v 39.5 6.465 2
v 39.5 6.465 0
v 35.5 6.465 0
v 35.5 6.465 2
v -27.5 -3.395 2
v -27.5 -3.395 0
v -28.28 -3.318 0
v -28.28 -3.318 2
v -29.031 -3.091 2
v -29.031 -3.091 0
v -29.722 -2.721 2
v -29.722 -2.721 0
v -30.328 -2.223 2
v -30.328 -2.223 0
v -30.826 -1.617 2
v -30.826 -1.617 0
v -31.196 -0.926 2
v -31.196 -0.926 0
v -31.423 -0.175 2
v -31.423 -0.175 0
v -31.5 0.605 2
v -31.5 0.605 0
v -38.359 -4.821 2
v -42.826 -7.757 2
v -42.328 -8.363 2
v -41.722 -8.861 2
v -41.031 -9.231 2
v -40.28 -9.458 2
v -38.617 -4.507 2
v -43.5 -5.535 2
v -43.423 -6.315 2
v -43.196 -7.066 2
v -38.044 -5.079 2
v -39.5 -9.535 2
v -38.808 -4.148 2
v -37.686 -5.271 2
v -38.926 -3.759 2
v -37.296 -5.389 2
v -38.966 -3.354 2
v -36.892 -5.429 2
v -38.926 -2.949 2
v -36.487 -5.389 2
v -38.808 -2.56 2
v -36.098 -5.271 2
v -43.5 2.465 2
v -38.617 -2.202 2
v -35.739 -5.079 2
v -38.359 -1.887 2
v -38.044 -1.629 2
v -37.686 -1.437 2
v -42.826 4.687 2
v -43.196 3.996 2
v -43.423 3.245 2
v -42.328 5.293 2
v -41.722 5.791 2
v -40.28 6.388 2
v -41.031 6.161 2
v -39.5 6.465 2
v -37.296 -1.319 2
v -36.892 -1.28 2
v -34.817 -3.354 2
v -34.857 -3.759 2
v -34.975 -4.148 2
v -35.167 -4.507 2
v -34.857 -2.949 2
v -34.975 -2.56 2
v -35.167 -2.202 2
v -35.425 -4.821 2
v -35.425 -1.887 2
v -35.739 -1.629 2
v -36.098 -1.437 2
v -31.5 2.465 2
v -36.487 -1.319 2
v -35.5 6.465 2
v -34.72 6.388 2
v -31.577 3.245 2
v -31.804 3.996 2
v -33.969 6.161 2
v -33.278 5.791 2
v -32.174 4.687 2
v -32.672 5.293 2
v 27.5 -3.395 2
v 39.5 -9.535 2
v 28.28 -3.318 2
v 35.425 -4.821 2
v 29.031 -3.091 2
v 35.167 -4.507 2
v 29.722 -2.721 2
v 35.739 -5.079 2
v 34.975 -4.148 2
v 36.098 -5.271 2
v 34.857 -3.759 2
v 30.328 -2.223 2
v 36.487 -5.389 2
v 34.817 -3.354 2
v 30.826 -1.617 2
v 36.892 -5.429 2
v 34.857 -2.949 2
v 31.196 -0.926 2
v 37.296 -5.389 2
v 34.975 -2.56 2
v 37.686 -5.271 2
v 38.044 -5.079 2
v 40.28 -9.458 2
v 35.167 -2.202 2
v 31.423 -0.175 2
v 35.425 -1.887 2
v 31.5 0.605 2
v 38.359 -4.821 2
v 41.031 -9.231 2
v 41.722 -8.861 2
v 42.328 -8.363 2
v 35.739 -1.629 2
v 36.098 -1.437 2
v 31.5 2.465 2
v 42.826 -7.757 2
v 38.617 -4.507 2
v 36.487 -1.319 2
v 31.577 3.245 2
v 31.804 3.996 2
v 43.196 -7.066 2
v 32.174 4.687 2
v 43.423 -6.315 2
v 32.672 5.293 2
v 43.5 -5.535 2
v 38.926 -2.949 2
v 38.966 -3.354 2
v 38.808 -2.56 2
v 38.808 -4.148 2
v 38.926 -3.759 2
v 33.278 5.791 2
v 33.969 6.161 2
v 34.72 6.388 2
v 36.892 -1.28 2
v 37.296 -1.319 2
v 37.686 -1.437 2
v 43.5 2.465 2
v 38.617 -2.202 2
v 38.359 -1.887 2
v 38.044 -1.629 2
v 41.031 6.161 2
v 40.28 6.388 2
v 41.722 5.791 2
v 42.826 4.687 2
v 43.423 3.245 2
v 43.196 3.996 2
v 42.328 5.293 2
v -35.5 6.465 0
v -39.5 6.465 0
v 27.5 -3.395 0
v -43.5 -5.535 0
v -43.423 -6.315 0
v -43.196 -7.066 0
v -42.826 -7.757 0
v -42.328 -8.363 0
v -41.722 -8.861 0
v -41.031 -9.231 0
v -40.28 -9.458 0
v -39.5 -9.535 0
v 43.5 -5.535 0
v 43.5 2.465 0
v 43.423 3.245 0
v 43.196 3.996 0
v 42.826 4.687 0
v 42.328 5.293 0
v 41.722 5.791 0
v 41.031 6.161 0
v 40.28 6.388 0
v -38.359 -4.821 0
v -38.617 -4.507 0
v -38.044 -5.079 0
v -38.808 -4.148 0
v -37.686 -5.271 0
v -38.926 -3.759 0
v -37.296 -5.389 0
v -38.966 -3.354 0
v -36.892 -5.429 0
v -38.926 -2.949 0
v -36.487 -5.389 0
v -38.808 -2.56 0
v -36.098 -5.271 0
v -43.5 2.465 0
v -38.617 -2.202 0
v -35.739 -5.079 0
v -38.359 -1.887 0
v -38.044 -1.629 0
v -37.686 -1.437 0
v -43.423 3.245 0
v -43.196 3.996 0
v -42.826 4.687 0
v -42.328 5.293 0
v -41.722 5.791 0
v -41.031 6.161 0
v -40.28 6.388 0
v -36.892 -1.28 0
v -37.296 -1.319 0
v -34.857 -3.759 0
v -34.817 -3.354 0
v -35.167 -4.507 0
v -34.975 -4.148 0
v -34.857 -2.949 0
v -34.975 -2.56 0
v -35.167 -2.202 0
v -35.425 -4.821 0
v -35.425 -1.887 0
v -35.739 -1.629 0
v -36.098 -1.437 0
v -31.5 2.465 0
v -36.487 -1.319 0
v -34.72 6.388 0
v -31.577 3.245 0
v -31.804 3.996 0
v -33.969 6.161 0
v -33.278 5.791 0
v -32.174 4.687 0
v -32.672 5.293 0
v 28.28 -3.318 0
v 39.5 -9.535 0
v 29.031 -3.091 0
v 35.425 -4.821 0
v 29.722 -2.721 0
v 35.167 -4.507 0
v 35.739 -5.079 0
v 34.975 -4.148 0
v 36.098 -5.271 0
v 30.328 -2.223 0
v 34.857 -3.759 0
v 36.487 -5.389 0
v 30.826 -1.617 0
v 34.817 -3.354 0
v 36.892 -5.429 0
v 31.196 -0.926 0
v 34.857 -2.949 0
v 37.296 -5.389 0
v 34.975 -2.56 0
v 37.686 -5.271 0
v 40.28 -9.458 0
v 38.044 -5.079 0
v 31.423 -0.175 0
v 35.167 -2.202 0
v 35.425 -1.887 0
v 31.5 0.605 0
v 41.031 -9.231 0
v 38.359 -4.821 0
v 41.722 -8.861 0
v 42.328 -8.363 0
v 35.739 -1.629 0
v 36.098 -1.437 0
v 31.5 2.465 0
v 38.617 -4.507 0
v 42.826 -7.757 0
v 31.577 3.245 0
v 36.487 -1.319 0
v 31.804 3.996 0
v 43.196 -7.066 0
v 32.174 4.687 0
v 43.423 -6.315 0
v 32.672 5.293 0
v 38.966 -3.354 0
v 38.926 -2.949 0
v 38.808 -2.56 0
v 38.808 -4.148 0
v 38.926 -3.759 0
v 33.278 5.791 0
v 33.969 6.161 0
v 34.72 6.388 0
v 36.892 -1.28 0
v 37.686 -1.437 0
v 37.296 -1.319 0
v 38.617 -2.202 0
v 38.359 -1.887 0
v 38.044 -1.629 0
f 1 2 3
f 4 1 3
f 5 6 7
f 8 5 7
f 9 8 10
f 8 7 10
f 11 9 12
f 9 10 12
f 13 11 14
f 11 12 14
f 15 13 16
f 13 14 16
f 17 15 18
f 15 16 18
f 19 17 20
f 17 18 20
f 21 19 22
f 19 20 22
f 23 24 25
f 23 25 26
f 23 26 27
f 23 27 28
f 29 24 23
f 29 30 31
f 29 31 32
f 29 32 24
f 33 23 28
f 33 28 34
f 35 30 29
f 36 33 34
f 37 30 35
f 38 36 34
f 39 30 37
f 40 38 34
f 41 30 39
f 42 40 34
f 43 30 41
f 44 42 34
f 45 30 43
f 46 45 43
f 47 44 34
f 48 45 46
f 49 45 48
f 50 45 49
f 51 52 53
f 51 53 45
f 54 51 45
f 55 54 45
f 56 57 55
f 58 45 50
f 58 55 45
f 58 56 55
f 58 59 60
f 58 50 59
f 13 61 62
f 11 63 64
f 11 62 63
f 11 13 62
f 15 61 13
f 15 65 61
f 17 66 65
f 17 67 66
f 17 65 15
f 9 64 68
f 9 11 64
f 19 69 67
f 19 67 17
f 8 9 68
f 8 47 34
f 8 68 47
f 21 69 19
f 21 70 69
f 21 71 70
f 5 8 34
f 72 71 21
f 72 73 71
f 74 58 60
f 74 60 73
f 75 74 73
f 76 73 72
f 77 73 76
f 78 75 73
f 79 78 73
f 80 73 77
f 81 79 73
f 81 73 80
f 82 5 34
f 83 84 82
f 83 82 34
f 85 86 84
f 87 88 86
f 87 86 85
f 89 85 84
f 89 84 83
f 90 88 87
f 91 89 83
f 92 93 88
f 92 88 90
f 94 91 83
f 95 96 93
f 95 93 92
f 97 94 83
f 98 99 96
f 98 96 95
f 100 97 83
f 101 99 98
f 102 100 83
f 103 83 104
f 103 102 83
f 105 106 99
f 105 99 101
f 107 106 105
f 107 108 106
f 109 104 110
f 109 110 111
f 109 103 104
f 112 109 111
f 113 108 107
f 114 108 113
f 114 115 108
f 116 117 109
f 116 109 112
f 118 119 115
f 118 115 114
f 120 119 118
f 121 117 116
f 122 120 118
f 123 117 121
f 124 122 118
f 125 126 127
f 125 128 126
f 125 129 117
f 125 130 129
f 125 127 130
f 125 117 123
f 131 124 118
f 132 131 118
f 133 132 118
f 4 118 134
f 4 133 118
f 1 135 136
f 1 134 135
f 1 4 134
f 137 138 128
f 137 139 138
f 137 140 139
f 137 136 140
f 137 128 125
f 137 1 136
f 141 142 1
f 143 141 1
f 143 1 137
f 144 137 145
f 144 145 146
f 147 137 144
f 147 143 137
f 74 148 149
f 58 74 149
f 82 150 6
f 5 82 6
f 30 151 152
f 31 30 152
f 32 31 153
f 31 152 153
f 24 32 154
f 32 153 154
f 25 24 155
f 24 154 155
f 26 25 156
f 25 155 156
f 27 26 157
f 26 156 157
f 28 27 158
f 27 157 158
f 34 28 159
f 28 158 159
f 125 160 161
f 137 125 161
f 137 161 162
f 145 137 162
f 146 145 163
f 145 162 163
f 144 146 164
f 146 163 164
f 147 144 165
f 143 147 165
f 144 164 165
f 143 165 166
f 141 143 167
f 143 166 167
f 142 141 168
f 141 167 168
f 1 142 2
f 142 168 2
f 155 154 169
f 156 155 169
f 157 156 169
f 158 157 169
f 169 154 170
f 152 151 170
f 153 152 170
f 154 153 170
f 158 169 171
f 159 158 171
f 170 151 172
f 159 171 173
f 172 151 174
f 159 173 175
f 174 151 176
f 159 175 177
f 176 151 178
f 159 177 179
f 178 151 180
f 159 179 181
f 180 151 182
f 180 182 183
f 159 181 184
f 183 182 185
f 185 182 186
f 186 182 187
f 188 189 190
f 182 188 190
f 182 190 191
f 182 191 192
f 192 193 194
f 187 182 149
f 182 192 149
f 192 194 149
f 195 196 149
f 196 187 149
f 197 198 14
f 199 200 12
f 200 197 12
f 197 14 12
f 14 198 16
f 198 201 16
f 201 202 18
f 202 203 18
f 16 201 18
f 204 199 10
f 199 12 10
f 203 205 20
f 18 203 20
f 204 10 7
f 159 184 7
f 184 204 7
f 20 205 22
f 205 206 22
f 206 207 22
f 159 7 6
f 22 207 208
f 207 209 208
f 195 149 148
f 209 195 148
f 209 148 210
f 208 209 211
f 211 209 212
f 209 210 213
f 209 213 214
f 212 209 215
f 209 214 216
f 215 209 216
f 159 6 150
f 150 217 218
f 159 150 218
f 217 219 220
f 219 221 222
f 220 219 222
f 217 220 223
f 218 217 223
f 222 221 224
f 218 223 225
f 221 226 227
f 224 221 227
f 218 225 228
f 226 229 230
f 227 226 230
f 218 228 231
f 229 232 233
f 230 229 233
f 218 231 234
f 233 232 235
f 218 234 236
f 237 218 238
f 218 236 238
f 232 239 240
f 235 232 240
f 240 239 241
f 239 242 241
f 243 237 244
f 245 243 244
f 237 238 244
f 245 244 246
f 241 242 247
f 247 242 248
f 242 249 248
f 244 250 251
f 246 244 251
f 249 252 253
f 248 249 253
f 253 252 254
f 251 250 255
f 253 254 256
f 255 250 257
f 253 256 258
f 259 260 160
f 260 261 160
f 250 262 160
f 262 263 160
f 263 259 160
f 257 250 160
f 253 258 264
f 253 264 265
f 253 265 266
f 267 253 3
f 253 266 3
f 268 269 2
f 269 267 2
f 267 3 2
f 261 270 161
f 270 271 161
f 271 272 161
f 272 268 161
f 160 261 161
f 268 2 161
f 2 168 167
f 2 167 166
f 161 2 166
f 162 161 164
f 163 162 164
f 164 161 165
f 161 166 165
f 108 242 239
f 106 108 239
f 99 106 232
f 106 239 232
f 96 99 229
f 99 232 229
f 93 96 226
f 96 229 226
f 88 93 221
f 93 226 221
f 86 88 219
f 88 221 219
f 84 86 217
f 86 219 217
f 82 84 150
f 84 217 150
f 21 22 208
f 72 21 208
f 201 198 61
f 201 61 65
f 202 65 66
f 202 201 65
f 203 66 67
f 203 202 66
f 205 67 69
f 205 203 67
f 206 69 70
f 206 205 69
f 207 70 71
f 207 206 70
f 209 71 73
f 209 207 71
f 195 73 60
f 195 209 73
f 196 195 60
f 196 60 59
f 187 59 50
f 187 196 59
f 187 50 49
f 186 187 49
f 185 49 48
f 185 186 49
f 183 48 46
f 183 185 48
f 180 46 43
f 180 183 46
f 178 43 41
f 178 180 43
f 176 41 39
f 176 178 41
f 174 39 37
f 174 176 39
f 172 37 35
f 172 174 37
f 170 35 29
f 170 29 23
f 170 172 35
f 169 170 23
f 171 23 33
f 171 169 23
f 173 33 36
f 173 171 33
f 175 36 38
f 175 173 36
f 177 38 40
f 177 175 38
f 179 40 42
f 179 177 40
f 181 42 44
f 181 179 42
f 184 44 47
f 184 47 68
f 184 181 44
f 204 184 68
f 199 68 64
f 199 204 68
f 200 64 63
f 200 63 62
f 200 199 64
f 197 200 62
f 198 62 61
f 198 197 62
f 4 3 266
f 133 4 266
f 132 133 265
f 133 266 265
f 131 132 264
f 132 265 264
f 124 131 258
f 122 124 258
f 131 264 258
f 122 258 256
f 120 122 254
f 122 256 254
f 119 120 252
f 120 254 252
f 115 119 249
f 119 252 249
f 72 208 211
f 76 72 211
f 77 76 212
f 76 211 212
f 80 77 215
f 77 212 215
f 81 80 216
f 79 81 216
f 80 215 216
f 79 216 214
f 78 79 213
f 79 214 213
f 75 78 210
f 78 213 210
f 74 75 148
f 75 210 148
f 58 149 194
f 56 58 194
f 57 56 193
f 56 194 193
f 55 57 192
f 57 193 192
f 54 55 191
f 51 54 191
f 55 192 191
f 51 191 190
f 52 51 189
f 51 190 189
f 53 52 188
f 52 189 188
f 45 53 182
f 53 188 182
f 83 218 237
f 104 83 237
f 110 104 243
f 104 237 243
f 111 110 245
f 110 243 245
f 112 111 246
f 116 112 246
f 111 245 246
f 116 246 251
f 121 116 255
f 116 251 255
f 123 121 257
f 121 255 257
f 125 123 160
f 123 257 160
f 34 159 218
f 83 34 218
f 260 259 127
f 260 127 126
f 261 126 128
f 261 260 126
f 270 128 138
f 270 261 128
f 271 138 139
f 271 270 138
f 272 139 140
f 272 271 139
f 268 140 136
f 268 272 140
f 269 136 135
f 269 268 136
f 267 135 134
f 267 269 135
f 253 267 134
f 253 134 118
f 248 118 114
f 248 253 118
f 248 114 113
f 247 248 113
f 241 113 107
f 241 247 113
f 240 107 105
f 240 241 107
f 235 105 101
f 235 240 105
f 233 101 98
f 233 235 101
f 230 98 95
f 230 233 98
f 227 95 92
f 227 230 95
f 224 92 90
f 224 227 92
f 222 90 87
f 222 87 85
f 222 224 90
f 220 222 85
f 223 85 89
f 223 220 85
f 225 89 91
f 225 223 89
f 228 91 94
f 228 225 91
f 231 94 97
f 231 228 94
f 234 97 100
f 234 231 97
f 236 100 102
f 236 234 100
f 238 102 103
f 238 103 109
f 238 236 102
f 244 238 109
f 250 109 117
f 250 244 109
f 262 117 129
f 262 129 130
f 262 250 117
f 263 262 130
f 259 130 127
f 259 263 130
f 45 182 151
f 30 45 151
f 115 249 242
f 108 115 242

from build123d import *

# Parameters (mm, degrees)
F0_R     = 2.074641
F1_DEPTH = 2


with BuildPart() as f1:
    # F0 (on Top) → F1 (new body)
    with BuildSketch(Plane.XY):
        with BuildLine():
            Line((-39.5, -9.535), (39.5, -9.535))
            ThreePointArc((39.5, -9.535), (42.328427, -8.363427), (43.5, -5.535))
            Line((43.5, -5.535), (43.5, 2.465))
            ThreePointArc((43.5, 2.465), (42.328427, 5.293427), (39.5, 6.465))
            Line((39.5, 6.465), (35.5, 6.465))
            ThreePointArc((35.5, 6.465), (32.671573, 5.293427), (31.5, 2.465))
            Line((31.5, 2.465), (31.5, 0.605))
            ThreePointArc((31.5, 0.605), (30.328427, -2.223427), (27.5, -3.395))
            Line((27.5, -3.395), (-27.5, -3.395))
            ThreePointArc((-27.5, -3.395), (-30.328427, -2.223427), (-31.5, 0.605))
            Line((-31.5, 0.605), (-31.5, 2.465))
            ThreePointArc((-31.5, 2.465), (-32.671573, 5.293427), (-35.5, 6.465))
            Line((-35.5, 6.465), (-39.5, 6.465))
            ThreePointArc((-39.5, 6.465), (-42.328427, 5.293427), (-43.5, 2.465))
            Line((-43.5, 2.465), (-43.5, -5.535))
            ThreePointArc((-43.5, -5.535), (-42.328427, -8.363427), (-39.5, -9.535))
        make_face()
        with Locations((-36.891578, -3.354191)):
            Circle(F0_R, mode=Mode.SUBTRACT)
        with Locations((36.891578, -3.354191)):
            Circle(F0_R, mode=Mode.SUBTRACT)
    extrude(amount=F1_DEPTH)


solid = f1.part
